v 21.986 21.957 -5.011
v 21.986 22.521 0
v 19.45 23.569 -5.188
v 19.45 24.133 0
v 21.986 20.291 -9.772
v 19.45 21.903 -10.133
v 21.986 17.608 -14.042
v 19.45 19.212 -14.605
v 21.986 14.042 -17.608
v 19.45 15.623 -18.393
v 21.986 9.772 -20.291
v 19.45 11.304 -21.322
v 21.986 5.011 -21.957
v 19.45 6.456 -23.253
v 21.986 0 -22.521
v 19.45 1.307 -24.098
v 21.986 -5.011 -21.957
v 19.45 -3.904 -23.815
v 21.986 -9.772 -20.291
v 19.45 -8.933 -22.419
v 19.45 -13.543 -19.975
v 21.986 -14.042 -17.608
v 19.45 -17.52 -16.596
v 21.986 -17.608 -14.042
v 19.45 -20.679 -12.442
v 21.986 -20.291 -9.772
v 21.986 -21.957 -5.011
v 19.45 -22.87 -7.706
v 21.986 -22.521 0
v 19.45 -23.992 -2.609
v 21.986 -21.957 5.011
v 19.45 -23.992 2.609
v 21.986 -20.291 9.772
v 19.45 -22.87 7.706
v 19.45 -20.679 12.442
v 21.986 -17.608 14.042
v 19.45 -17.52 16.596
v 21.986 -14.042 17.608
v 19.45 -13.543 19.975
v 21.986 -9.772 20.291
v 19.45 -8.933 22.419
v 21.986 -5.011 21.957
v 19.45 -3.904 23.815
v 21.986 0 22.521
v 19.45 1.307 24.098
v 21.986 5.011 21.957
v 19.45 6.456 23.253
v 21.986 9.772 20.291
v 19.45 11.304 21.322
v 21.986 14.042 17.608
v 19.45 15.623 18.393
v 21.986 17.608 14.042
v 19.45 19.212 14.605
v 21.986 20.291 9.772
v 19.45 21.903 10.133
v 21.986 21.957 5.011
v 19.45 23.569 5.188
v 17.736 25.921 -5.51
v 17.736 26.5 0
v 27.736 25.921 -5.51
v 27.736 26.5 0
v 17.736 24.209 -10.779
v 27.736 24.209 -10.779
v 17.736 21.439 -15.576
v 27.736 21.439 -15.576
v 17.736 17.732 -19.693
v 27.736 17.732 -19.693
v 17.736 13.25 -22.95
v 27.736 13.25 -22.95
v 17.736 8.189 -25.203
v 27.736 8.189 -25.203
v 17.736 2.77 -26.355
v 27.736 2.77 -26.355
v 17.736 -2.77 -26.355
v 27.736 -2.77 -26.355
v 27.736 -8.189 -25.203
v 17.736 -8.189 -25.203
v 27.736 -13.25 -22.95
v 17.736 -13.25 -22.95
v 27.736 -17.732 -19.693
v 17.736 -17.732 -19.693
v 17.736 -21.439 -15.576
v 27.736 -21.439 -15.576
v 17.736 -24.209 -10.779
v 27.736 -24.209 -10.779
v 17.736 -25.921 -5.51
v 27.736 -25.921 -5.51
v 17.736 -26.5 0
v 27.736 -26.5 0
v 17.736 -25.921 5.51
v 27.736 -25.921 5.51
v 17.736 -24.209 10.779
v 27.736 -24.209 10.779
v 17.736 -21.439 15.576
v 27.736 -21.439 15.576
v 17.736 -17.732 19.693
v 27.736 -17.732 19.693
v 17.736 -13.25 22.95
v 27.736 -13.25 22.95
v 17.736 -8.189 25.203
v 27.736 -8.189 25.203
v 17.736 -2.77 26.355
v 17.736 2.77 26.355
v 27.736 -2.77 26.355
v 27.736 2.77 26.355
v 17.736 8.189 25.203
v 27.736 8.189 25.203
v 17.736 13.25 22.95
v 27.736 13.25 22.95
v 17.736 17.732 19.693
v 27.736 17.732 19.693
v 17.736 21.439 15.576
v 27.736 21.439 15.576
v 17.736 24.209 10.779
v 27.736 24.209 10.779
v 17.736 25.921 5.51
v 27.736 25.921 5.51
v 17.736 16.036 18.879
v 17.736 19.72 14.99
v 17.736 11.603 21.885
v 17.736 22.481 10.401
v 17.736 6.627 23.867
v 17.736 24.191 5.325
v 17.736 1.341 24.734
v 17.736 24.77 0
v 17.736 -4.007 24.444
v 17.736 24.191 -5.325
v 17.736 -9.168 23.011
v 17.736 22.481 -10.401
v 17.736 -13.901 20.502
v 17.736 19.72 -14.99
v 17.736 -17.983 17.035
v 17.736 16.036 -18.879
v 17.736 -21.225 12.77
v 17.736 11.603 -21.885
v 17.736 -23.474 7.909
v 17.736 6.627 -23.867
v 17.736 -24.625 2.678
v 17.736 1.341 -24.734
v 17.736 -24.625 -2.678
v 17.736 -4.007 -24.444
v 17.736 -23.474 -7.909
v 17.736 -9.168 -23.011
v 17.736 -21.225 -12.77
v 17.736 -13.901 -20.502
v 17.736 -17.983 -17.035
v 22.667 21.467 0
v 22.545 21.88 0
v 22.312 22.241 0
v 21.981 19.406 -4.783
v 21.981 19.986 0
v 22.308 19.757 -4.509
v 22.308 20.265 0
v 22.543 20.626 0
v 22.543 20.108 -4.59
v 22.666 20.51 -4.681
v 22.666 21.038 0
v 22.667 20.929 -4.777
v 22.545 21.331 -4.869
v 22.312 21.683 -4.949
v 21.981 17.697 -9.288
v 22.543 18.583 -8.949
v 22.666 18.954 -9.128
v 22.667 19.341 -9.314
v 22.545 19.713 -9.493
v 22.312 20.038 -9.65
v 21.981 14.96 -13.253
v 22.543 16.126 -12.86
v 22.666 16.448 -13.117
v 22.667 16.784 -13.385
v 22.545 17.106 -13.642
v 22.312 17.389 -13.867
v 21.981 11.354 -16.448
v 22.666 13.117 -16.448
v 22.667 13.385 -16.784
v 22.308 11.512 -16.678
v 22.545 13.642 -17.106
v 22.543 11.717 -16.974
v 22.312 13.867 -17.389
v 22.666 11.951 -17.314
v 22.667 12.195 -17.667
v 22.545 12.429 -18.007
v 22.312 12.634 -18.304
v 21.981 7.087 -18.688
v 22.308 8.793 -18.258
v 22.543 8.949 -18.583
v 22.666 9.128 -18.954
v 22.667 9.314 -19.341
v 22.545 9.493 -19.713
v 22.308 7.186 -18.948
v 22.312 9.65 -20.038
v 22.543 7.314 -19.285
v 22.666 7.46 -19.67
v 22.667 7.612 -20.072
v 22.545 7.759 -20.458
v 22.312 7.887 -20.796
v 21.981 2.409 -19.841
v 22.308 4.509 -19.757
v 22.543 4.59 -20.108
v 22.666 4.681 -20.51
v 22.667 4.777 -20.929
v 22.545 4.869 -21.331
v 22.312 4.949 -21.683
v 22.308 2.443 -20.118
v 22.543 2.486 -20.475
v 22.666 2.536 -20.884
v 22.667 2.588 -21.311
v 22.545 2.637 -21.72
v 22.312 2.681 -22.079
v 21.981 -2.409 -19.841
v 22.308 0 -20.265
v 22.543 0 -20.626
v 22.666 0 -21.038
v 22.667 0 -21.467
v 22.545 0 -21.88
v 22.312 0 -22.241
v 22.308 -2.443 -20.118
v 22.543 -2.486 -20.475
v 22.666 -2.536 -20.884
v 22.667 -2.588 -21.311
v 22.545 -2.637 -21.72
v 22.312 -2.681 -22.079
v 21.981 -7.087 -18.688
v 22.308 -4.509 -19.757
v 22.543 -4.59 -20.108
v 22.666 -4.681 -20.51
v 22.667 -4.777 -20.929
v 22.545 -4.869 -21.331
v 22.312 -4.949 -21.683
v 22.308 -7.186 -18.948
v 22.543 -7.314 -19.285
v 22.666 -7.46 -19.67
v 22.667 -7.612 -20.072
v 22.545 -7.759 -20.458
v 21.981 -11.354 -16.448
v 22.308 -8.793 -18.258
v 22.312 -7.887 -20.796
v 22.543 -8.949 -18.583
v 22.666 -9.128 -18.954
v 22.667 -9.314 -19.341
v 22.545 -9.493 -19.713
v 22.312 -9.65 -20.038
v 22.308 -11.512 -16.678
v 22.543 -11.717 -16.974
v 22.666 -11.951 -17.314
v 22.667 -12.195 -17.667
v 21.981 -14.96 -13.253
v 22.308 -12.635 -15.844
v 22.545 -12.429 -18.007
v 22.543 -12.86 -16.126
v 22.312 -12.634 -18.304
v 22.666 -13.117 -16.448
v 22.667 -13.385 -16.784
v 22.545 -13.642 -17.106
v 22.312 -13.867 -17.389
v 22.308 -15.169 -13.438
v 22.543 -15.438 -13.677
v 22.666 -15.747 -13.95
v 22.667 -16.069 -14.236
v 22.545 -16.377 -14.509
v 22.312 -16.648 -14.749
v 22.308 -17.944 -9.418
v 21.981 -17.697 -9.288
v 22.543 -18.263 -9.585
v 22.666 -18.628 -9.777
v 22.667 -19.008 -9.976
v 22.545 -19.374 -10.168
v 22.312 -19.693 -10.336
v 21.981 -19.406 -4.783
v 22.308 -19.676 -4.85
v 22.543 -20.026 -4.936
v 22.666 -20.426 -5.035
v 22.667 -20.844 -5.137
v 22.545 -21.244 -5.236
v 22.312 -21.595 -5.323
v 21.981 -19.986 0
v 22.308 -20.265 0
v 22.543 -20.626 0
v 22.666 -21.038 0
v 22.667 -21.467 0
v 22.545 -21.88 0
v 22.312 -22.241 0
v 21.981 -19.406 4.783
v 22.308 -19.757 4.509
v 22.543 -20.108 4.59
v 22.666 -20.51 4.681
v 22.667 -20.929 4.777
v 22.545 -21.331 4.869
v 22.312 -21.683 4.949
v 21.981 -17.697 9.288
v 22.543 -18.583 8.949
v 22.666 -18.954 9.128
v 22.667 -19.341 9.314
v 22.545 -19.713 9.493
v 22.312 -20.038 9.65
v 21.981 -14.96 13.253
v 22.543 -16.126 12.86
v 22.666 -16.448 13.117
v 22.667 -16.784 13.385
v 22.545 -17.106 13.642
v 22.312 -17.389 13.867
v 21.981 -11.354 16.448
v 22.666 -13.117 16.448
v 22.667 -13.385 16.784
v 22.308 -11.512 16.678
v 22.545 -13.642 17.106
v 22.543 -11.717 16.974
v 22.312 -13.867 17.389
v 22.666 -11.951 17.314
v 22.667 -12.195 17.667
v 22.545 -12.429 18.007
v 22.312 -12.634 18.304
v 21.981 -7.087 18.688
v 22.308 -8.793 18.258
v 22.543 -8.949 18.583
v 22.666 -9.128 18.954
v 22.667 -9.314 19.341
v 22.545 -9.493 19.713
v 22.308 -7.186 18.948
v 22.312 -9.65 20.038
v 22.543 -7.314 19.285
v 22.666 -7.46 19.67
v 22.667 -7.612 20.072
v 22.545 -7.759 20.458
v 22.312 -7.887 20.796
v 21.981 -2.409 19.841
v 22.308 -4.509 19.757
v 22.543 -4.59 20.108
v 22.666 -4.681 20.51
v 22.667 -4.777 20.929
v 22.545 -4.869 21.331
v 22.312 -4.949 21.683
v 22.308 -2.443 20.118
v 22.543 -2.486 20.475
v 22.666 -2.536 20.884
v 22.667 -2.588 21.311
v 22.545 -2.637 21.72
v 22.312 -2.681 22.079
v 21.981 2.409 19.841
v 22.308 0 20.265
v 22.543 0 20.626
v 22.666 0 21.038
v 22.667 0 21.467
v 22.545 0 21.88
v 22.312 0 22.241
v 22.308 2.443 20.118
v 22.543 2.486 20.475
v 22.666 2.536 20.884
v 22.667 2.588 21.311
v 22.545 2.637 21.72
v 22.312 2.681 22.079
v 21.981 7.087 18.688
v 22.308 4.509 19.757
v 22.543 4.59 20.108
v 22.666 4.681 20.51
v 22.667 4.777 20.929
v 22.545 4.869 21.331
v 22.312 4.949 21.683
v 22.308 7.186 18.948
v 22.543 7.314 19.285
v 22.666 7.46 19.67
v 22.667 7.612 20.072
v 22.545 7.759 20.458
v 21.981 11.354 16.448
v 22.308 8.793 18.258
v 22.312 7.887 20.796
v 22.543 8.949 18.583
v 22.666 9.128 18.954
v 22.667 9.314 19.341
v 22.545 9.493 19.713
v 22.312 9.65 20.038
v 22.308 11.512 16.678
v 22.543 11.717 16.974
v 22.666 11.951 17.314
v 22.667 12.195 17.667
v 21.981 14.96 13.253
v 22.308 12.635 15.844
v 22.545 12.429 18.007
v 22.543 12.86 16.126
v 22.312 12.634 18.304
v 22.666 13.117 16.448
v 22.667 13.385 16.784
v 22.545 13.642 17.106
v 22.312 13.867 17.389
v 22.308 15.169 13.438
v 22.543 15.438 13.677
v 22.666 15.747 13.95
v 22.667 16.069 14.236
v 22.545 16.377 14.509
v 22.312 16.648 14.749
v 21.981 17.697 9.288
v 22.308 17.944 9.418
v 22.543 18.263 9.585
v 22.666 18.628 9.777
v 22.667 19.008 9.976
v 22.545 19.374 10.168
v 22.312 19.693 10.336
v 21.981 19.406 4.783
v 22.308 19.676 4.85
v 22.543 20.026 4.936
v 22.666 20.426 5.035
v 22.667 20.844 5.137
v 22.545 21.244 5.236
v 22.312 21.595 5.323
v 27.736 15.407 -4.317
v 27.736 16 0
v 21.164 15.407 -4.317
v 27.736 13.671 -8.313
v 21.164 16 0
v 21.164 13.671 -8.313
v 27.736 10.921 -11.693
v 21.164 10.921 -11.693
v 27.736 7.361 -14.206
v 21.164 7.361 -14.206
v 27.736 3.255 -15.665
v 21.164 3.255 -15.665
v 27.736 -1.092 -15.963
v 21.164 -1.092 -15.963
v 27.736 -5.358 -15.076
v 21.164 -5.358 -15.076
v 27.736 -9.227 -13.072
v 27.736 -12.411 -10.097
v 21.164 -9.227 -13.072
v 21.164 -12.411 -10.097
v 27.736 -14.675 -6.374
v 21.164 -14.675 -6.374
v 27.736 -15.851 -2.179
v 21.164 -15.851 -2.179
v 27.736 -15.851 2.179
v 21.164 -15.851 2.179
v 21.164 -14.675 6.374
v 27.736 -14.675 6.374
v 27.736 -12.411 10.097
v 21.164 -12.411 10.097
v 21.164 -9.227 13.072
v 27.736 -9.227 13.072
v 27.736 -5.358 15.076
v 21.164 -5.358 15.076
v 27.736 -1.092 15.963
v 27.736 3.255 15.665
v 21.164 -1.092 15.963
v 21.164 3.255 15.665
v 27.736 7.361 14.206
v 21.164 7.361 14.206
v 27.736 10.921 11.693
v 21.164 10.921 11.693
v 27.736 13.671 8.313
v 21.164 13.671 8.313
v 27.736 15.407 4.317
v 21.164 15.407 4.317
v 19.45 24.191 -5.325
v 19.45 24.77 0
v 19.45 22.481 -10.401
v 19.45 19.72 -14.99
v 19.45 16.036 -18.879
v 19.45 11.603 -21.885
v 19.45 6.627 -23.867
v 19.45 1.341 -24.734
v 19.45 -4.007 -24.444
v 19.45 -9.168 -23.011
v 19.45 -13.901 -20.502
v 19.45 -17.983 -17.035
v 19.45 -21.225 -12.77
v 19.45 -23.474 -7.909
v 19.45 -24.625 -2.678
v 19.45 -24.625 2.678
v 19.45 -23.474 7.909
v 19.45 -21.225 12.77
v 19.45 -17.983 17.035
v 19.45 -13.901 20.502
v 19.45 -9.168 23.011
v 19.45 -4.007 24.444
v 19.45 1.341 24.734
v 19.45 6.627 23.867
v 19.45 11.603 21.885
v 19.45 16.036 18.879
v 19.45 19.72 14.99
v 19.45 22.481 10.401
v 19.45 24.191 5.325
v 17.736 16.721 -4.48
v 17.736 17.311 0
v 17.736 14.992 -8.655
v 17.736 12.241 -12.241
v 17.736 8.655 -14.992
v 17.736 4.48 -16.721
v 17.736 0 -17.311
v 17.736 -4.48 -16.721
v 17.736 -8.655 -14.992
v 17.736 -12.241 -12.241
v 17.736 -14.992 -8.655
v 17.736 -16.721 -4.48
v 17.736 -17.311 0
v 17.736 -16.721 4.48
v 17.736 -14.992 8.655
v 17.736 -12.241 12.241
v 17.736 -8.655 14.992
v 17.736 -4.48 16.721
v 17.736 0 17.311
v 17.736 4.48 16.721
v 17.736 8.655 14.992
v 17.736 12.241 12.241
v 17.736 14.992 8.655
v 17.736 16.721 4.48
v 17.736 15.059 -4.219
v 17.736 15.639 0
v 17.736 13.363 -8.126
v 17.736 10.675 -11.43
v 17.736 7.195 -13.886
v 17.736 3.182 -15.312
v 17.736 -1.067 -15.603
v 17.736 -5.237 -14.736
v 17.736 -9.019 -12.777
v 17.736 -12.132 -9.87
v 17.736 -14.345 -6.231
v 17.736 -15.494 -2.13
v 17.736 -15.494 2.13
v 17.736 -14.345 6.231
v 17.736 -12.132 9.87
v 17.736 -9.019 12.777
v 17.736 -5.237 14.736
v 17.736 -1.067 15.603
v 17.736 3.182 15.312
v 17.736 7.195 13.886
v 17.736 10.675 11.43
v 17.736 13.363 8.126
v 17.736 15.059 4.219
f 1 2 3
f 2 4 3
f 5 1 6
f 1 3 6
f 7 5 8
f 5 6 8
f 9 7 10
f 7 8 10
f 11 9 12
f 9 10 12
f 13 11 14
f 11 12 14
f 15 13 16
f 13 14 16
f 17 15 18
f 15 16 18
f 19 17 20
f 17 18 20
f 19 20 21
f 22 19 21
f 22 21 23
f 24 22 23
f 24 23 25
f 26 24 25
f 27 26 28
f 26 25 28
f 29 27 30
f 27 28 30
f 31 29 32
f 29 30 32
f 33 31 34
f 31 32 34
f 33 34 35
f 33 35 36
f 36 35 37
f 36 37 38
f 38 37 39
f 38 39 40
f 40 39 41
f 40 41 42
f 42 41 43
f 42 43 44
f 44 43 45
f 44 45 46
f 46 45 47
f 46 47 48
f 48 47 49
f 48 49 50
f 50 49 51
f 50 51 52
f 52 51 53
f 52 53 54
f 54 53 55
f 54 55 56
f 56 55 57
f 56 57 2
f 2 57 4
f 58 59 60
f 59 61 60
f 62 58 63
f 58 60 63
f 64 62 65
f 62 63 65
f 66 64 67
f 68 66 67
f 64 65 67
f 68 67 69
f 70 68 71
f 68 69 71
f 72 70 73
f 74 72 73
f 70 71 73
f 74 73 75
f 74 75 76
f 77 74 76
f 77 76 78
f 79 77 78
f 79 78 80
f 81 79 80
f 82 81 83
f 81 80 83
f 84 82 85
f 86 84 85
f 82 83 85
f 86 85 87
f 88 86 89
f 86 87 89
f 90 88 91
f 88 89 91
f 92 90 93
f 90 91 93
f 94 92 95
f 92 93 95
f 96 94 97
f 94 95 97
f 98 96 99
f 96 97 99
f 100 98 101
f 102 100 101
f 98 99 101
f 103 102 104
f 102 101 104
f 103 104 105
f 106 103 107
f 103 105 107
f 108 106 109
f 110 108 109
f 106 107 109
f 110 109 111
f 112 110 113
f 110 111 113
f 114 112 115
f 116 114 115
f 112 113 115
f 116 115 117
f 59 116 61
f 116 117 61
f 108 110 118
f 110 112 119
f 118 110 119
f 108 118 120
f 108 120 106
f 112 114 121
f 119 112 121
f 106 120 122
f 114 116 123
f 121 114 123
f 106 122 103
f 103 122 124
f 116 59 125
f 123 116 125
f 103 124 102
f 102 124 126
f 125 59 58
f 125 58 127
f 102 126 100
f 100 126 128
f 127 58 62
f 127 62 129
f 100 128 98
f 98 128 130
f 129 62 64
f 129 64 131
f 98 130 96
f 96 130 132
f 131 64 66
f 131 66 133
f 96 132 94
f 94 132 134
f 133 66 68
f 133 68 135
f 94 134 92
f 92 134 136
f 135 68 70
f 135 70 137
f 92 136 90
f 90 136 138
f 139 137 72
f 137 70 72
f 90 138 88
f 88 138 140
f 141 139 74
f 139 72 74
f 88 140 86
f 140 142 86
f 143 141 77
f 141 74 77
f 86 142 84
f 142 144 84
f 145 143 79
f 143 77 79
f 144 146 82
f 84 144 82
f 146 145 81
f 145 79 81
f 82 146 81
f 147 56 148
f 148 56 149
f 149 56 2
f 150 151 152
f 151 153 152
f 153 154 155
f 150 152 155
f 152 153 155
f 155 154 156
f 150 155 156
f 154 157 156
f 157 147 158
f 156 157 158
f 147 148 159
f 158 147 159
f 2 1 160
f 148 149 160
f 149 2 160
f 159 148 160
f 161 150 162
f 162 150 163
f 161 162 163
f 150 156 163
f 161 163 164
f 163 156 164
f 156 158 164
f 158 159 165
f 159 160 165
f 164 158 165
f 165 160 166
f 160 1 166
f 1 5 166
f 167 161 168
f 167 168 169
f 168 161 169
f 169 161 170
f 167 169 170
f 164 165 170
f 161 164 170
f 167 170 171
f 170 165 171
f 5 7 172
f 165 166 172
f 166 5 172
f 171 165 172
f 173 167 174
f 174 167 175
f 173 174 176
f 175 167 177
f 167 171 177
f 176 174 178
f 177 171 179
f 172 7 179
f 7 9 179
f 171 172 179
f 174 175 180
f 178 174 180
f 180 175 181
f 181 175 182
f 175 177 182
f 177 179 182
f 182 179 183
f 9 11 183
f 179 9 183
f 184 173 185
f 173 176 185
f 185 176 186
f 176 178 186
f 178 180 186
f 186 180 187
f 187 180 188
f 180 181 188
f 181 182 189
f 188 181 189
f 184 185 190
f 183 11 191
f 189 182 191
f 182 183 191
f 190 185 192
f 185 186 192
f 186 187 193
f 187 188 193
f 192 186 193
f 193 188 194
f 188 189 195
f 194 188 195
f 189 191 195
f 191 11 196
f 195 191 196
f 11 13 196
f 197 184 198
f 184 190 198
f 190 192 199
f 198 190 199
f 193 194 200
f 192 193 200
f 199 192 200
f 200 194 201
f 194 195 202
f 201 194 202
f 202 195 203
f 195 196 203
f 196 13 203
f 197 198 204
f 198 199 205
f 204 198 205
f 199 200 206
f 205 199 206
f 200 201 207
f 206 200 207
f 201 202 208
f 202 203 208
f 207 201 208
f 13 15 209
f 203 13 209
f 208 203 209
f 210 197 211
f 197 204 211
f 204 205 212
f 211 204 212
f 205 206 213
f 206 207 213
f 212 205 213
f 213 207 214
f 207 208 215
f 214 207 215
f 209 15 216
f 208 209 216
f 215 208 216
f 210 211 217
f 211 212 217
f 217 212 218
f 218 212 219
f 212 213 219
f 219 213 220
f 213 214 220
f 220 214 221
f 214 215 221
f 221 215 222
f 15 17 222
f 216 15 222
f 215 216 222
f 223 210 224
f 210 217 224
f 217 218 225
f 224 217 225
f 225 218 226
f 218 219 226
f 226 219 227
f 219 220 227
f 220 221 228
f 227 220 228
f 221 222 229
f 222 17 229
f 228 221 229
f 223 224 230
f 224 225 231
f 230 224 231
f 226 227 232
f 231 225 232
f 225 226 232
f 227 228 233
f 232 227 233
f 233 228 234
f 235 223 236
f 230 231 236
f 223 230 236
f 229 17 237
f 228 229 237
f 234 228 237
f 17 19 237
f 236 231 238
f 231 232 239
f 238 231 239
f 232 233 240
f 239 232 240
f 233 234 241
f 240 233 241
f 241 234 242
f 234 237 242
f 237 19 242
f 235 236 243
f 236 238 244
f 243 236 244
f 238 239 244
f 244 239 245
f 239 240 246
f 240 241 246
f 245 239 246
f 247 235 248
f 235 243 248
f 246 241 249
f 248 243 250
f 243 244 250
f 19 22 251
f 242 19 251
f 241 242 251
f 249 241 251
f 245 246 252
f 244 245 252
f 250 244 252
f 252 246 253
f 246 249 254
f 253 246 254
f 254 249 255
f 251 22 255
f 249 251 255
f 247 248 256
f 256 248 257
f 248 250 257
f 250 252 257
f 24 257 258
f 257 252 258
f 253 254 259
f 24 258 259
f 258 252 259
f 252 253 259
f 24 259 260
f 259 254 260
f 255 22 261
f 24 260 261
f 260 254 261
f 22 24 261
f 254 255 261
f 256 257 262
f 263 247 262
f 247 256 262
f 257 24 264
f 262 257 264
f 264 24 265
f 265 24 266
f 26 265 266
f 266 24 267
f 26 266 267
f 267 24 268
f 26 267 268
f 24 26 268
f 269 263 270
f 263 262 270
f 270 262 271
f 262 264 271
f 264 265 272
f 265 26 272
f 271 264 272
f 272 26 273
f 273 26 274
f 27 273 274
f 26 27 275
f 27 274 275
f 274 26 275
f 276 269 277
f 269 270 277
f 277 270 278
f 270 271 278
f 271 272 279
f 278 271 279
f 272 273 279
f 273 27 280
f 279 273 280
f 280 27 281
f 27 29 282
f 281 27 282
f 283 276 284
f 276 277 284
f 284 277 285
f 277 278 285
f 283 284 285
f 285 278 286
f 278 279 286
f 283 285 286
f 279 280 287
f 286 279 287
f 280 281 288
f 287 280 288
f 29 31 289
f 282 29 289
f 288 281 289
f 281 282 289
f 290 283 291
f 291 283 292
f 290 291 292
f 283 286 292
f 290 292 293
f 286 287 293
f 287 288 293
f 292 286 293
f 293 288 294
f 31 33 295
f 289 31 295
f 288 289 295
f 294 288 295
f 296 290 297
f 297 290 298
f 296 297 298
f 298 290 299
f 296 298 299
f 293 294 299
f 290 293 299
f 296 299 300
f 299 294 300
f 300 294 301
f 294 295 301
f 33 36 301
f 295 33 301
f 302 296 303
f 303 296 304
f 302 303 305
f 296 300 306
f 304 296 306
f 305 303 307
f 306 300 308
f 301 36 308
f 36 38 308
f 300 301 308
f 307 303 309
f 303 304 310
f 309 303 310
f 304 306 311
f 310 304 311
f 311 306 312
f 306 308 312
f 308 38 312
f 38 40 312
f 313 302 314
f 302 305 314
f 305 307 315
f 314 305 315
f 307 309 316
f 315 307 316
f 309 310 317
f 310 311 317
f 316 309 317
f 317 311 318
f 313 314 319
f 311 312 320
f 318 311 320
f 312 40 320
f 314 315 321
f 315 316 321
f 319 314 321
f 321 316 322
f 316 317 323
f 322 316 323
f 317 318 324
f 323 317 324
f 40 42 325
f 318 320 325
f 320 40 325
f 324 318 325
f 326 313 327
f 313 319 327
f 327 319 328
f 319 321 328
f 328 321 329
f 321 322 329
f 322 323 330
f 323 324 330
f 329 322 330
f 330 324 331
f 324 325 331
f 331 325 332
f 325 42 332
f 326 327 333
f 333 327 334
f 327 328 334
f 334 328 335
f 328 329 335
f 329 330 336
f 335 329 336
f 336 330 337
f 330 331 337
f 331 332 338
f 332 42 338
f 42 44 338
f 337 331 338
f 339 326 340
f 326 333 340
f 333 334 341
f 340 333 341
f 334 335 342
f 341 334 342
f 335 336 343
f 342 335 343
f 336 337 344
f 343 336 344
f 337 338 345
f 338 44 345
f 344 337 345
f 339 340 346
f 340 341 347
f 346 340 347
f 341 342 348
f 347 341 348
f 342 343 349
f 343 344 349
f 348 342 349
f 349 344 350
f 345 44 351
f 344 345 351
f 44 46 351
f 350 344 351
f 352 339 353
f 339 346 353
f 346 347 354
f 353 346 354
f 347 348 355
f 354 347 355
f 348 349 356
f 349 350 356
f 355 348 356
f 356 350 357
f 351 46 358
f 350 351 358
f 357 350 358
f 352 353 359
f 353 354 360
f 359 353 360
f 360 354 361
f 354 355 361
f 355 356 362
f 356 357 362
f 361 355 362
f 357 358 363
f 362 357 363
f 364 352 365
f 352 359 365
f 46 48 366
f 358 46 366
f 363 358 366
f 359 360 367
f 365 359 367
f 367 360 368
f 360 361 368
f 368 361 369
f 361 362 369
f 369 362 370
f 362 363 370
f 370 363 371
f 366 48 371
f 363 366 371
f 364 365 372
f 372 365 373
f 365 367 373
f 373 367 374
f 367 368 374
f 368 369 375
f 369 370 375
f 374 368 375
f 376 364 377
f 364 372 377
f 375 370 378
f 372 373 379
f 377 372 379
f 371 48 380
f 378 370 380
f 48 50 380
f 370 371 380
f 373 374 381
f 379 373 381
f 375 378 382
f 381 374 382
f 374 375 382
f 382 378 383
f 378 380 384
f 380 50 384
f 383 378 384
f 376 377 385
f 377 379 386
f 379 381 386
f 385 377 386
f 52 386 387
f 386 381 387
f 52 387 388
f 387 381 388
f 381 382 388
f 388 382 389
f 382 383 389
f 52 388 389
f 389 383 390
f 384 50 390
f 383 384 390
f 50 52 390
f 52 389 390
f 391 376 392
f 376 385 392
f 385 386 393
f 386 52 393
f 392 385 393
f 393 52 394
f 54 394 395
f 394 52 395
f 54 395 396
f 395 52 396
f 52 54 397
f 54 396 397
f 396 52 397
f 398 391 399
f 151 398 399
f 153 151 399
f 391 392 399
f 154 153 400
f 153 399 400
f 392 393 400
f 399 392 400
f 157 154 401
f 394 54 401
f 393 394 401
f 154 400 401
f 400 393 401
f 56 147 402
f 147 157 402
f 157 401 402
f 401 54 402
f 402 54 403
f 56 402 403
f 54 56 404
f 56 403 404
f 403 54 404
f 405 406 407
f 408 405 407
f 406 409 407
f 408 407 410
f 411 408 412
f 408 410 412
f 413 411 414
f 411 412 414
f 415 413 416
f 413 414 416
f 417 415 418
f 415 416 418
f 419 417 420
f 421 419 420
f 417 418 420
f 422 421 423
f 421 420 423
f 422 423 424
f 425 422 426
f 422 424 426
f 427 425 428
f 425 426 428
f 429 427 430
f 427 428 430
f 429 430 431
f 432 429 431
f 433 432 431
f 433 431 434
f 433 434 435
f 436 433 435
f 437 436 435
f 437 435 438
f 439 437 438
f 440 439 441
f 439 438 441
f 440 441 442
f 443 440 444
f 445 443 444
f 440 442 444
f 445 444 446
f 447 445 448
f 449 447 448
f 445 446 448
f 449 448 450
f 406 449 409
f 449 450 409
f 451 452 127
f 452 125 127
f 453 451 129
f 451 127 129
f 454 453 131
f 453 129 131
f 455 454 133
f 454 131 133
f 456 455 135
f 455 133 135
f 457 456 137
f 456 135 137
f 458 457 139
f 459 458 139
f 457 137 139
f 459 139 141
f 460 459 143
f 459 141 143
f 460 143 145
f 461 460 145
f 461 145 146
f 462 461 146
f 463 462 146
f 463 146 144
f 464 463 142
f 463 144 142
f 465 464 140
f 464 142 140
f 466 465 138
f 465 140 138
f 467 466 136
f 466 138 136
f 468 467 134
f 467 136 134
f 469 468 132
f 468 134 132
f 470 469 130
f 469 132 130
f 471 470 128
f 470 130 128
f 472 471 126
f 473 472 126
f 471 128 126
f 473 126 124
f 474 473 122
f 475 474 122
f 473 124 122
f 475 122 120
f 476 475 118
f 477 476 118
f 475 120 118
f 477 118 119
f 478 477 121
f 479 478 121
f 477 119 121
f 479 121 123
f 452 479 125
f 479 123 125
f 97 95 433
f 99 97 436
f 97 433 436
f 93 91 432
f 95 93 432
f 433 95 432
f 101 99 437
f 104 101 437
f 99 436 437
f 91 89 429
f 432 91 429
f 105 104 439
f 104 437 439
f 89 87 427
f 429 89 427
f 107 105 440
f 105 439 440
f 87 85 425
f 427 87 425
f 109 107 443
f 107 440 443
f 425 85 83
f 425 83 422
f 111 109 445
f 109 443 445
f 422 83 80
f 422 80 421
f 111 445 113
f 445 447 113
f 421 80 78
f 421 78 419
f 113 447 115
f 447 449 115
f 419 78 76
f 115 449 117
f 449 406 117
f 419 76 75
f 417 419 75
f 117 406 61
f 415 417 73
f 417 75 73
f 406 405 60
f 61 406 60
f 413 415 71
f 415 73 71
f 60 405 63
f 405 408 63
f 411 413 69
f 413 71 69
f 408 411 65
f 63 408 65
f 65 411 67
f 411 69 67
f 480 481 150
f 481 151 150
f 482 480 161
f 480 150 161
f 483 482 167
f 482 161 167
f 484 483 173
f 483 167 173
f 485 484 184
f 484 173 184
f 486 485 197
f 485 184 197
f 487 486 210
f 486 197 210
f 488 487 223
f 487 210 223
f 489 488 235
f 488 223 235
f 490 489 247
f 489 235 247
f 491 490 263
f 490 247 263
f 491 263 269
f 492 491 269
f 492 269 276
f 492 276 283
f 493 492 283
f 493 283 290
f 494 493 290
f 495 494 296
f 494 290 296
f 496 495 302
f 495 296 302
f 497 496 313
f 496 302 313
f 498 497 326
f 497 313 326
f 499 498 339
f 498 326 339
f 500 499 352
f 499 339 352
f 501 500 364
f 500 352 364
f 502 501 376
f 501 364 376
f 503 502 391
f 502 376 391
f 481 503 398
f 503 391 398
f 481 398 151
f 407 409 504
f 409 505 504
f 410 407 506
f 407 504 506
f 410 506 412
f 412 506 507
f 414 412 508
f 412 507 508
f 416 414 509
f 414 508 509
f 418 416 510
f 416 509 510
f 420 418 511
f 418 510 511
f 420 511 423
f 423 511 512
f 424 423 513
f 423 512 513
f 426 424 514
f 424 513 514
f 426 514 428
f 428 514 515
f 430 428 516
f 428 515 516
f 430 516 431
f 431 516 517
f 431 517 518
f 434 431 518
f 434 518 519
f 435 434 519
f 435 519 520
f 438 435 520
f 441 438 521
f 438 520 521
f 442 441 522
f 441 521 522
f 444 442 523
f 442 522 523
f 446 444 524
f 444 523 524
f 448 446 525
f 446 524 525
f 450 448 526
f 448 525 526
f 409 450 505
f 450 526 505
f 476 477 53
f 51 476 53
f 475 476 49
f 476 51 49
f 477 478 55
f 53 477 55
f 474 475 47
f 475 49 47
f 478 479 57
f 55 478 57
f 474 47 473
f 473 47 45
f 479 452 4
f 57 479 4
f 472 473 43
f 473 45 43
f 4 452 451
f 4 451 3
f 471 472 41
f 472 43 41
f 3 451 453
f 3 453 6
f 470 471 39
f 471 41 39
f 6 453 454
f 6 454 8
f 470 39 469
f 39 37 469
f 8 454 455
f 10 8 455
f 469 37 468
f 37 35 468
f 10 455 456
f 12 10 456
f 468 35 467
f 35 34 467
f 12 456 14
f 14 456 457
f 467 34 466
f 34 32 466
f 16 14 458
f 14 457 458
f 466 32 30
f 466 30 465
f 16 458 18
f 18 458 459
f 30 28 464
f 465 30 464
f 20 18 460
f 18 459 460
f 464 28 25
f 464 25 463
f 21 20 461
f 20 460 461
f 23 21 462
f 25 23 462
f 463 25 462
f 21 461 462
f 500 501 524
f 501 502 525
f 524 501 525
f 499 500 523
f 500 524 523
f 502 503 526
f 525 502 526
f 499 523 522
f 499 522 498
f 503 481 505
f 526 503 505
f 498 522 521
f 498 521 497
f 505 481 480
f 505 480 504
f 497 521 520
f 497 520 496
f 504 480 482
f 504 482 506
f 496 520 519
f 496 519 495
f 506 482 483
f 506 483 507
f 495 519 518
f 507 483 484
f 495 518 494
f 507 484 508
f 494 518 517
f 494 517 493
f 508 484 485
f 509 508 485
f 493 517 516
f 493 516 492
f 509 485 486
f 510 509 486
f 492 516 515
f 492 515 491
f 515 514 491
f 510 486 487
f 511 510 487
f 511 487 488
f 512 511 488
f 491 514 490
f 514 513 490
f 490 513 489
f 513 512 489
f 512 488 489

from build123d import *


with BuildPart() as part:
    # Croquis1 → Revolución1 (revolve)
    with BuildSketch(Plane.XY):
        with BuildLine():
            Line((17.736410427, 26.5), (27.736410427, 26.5))
            Line((27.736410427, 26.5), (27.736410427, 16))
            Line((27.736410427, 16), (21.163988978, 16))
            Line((21.163988978, 16), (17.736410427, 15.639375442))
            Line((17.736410427, 15.639375442), (17.736410427, 17.310836969))
            Line((17.736410427, 17.310836969), (21.981402985, 19.98631181))
            ThreePointArc((21.981402985, 19.98631181), (22.681602121, 21.252464086), (21.986190134, 22.521251927))
            Line((21.986190134, 22.521251927), (19.450199702, 24.133015759))
            Line((19.450199702, 24.133015759), (19.450199702, 24.770374886))
            Line((19.450199702, 24.770374886), (17.736410427, 24.770374886))
            Line((17.736410427, 24.770374886), (17.736410427, 26.5))
        make_face()
    revolve(axis=Axis((54.736410427, 0, 0), (-1, 0, 0)))


solid = part.part
